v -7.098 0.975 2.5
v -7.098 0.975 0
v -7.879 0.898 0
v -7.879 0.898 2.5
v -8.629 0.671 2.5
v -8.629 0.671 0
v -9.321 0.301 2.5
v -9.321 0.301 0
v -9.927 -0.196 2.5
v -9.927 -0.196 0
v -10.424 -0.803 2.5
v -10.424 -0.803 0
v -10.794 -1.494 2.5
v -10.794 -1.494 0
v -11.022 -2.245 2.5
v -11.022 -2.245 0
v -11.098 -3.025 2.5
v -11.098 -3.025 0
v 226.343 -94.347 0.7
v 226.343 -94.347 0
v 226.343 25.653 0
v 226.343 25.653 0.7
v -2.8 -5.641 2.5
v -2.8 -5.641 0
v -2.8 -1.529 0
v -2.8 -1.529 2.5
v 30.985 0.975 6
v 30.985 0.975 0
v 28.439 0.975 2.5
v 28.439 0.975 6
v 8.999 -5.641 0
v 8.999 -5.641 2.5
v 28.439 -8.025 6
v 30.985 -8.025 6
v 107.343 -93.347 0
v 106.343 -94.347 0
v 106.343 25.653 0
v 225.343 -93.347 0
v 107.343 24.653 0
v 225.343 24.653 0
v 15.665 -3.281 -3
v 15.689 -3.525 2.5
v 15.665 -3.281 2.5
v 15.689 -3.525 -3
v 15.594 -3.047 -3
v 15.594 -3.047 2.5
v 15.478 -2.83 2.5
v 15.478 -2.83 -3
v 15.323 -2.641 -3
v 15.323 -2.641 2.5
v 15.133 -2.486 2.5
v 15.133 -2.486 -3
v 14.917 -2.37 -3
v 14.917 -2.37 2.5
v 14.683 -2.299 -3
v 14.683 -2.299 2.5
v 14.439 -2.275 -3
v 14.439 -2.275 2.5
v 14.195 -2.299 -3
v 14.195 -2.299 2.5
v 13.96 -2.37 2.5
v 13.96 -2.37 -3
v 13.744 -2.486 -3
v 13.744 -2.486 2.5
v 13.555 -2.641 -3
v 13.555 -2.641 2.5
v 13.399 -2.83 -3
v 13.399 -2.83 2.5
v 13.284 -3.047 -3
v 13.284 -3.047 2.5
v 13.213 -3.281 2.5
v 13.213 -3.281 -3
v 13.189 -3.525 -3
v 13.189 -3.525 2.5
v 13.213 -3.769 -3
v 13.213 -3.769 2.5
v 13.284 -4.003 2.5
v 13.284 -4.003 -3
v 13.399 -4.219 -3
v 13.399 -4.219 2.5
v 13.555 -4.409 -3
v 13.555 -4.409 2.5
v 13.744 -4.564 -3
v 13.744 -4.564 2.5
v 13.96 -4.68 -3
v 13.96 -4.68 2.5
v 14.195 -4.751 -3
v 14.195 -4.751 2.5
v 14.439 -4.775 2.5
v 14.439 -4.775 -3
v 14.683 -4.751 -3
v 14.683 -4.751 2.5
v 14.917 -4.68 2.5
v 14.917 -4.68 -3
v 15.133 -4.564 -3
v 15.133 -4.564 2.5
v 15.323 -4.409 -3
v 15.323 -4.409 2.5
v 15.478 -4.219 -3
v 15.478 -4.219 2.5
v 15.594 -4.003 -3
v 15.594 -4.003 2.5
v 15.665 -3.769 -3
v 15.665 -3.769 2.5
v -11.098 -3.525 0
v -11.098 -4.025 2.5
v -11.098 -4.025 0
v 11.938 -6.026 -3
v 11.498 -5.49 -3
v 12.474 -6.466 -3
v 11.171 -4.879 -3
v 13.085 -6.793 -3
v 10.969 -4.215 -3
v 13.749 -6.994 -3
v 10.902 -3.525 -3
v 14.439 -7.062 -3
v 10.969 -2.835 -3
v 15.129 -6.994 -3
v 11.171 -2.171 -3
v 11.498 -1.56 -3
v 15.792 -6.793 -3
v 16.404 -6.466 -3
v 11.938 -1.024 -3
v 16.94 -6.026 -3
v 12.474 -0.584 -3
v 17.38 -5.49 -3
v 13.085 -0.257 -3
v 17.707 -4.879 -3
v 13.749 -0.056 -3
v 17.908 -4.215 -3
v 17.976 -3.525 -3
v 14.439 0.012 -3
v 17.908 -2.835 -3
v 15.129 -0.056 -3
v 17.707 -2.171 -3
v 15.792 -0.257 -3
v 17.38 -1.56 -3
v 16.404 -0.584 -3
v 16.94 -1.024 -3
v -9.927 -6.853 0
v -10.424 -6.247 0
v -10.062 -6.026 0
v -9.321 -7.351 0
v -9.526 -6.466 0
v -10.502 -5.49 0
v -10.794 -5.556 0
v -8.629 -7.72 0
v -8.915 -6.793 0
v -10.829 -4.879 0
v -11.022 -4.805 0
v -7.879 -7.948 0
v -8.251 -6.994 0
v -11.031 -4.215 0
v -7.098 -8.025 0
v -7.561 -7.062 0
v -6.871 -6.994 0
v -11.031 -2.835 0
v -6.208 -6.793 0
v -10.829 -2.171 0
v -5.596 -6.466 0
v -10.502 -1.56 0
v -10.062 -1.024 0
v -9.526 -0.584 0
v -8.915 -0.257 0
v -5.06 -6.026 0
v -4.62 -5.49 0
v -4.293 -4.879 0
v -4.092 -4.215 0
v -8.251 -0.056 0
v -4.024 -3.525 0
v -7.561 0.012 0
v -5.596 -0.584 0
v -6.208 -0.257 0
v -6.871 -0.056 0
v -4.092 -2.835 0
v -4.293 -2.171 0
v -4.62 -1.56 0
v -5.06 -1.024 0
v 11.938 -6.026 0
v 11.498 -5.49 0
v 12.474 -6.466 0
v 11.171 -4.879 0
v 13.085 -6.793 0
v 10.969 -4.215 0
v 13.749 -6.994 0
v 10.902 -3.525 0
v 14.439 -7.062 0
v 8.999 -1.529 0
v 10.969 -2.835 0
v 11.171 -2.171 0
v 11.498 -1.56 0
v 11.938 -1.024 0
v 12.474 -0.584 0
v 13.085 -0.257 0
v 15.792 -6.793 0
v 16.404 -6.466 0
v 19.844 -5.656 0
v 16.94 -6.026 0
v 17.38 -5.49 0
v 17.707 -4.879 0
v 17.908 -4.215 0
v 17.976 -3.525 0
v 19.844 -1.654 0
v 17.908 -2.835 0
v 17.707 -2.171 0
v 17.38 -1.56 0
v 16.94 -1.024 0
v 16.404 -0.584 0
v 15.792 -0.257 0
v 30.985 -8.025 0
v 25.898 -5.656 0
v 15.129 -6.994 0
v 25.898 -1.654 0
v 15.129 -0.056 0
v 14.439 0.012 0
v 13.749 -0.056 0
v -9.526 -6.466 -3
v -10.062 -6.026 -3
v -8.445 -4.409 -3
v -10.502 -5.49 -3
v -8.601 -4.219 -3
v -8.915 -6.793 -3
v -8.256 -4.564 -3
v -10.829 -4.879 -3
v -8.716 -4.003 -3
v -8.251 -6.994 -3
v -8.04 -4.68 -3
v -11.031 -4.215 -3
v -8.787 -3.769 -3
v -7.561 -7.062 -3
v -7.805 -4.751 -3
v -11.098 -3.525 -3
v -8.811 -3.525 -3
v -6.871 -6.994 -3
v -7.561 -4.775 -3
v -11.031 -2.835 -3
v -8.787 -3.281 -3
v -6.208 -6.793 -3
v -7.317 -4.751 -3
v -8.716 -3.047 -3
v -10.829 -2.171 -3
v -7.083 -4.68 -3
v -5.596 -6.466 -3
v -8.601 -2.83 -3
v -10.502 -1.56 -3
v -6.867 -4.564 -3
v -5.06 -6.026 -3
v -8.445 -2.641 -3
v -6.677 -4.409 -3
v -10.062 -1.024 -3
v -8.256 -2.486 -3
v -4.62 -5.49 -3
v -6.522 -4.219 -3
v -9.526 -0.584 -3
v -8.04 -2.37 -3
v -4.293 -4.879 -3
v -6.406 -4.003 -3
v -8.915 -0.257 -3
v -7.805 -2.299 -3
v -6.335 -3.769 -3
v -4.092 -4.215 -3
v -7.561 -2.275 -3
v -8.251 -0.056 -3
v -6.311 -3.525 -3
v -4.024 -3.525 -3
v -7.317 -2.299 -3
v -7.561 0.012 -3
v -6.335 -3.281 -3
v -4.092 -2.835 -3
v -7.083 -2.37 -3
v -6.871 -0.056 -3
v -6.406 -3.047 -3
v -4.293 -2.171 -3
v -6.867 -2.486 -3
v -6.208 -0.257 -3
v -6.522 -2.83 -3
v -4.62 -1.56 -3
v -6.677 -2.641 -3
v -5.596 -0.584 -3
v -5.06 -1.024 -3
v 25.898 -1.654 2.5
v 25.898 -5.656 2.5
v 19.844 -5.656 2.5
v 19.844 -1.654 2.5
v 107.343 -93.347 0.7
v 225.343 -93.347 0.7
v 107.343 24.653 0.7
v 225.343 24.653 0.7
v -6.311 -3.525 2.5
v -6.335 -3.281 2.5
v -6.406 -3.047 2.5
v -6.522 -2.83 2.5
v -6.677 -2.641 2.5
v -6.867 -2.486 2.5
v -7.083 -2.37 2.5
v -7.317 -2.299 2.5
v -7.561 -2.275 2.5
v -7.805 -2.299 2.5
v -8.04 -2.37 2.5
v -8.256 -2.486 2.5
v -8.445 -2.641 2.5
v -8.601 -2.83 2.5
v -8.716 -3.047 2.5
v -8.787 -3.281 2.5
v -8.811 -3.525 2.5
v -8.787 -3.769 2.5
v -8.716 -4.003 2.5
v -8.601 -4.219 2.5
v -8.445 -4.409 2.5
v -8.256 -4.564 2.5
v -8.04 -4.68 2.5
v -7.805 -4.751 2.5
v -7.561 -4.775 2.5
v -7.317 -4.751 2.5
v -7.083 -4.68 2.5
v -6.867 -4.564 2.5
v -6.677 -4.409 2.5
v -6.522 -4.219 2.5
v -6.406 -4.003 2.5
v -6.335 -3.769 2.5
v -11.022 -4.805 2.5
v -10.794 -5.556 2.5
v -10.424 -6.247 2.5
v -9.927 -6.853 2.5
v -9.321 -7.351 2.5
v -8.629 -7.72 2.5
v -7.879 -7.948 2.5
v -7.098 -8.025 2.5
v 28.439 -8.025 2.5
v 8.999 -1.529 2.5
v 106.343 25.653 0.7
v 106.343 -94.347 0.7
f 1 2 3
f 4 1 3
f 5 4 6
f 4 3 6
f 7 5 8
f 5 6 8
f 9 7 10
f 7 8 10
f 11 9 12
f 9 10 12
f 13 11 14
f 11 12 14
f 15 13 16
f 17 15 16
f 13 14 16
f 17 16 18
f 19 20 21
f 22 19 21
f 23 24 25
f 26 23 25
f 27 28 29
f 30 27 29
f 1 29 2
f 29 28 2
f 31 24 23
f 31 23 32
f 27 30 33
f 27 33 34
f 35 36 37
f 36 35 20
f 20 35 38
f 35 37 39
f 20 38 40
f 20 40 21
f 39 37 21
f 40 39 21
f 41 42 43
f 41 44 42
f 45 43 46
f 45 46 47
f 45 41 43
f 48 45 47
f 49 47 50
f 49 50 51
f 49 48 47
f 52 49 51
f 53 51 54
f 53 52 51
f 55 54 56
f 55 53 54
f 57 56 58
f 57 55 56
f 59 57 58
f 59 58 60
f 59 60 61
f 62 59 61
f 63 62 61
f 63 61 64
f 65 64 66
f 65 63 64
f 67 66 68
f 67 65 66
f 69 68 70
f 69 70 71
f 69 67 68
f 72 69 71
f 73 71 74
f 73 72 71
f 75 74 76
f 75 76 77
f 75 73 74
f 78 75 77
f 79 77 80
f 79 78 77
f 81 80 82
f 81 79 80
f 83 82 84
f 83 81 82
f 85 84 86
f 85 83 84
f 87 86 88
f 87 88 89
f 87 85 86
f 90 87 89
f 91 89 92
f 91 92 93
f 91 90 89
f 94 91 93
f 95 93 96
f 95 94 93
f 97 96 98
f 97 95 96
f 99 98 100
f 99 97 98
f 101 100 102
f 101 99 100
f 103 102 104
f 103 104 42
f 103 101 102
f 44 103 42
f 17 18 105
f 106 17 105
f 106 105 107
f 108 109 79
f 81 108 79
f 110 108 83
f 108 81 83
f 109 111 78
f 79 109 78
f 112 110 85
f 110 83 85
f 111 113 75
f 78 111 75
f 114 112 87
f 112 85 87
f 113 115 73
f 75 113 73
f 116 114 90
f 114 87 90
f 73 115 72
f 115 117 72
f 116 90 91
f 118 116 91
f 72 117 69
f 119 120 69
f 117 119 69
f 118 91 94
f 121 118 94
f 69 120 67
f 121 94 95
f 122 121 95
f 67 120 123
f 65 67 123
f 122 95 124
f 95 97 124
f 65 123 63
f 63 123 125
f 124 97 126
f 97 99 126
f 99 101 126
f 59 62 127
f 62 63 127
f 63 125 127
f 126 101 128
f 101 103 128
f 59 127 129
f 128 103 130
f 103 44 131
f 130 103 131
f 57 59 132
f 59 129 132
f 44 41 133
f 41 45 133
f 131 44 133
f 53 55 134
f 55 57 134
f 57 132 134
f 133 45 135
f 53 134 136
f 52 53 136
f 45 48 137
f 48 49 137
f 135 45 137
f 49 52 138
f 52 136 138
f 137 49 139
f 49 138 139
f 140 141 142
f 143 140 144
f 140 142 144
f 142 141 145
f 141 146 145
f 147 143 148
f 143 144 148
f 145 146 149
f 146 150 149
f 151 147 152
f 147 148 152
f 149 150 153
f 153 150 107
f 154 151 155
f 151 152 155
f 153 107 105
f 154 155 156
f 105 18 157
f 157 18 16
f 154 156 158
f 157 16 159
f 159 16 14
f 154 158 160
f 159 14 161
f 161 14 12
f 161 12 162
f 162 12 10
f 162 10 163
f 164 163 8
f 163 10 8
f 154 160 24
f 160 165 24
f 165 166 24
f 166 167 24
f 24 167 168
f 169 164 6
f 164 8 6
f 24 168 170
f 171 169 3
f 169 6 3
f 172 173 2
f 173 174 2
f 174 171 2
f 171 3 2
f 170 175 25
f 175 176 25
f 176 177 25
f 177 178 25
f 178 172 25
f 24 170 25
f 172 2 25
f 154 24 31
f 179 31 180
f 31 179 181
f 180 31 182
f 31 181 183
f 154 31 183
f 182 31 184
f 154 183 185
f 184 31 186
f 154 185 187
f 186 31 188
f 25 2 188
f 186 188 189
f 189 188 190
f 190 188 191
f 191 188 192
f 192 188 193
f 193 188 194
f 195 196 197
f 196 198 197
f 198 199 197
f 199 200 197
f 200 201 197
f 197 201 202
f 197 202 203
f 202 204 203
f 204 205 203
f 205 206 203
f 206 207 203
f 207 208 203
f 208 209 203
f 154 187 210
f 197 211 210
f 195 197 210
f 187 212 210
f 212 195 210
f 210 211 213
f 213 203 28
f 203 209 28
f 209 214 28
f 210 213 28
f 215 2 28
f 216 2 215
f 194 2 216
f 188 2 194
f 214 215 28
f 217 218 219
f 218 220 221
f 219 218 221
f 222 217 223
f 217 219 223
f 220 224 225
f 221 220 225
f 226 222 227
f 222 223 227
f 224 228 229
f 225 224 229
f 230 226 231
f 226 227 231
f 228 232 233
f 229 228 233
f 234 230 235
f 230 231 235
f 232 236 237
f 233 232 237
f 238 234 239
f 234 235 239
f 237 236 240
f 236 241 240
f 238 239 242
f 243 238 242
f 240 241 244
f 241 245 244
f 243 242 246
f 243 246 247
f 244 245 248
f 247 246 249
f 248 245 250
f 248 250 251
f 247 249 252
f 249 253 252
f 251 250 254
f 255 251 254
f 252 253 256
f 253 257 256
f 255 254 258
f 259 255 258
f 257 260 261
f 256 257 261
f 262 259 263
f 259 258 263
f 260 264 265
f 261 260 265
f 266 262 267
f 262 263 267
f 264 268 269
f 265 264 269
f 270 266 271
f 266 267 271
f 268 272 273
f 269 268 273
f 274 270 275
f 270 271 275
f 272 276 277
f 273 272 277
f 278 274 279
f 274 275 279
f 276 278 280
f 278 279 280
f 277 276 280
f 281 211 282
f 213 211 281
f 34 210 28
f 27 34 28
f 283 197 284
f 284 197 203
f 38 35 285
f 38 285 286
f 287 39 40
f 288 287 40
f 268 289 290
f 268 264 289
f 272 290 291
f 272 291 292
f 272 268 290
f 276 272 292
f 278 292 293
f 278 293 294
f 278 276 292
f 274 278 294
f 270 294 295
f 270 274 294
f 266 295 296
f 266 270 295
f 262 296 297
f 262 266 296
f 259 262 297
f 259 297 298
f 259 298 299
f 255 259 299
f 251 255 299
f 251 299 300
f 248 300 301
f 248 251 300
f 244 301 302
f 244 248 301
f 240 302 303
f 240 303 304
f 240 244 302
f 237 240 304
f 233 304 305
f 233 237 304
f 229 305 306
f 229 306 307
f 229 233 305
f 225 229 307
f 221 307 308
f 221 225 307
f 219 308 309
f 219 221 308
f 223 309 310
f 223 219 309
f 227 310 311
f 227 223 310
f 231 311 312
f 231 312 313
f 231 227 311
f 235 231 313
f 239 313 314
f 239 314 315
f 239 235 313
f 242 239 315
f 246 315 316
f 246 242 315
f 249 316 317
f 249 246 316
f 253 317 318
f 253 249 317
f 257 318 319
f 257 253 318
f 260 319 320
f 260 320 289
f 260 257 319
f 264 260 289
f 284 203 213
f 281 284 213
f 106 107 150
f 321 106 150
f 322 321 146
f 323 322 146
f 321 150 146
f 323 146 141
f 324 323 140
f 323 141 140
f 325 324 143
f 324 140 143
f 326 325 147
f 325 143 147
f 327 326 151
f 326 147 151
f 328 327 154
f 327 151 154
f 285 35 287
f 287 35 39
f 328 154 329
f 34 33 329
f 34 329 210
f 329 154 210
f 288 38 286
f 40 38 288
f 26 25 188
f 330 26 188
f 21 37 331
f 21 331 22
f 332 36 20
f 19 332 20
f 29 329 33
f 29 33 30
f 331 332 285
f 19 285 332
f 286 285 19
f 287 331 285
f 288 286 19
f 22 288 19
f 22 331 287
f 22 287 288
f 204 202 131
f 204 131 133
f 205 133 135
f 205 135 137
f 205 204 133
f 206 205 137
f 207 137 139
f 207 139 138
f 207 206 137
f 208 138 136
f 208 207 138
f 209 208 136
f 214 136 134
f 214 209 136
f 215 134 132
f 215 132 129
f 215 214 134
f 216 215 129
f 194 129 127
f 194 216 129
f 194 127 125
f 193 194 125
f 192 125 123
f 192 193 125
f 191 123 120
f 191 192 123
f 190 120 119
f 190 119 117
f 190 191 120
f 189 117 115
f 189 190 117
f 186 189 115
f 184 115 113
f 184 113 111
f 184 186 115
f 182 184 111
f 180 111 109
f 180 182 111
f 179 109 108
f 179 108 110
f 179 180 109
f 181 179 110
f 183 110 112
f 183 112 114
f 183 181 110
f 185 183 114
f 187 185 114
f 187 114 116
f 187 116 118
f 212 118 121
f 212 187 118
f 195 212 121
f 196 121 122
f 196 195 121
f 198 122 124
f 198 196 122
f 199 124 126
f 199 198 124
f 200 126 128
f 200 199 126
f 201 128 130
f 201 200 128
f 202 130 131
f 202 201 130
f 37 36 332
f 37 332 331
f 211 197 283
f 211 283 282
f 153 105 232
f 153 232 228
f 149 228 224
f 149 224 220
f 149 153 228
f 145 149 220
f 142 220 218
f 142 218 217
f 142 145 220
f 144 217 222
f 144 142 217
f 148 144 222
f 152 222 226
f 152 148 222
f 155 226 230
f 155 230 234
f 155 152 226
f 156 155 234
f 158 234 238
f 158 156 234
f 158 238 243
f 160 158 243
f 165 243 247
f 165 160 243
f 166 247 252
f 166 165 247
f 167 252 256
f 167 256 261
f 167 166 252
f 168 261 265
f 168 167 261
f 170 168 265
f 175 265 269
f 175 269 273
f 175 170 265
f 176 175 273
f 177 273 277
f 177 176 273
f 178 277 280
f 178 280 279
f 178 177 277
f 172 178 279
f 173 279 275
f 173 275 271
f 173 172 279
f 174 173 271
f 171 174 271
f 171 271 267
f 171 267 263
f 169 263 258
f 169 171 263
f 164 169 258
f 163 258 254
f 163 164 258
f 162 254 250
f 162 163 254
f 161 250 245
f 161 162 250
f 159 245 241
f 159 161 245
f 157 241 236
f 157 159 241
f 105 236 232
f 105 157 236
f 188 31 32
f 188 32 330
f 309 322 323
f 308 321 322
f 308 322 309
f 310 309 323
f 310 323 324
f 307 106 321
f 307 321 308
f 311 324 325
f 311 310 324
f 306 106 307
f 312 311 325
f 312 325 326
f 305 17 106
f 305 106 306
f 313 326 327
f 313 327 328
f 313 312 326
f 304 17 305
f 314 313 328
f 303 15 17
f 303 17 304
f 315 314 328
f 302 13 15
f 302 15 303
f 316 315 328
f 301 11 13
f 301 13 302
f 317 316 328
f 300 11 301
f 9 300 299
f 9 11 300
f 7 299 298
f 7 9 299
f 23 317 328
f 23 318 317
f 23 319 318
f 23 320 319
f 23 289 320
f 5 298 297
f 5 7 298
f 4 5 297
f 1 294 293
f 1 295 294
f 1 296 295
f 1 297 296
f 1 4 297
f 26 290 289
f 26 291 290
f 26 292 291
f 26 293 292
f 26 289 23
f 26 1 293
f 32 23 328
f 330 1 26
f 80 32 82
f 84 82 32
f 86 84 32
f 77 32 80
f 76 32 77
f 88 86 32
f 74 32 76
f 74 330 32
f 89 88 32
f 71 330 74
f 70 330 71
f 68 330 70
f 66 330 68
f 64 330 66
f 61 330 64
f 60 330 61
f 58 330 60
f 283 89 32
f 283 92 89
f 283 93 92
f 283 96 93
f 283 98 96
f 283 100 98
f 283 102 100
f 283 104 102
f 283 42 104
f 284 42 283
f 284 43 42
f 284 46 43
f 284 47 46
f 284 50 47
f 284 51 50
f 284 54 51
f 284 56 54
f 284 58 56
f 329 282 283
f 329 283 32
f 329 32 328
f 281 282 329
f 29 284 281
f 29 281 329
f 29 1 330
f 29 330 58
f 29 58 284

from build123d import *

# Parameters (mm, degrees)
F0_W     = 11.7987894919
F0_H     = 4.111728631
F0_R     = 3.5371973142
F0_W_2   = 6.053224206
F0_H_2   = 4.0023974143
F0_W_3   = 2.5464419901
F0_H_3   = 9
F0_R_2   = 1.25
F1_DEPTH = 2.5
F2_DEPTH = 3
F3_DEPTH = 6
F4_DEPTH = 0.7
F0_W_4   = 120
F0_H_4   = 120
F0_W_5   = 118
F0_H_5   = 118


with BuildPart() as f1:
    # F0 (on Top) → F1 (new body)
    with BuildSketch(Plane.XY):
        with BuildLine():
            Line((28.4387205392, -8.0249160528), (28.4387205392, 0.9750839472))
            Line((28.4387205392, 0.9750839472), (-7.098476775, 0.9750839472))
            ThreePointArc((-7.098476775, 0.9750839472), (-9.9269038998, -0.1964889281), (-11.098476775, -3.0249160528))
            Line((-11.098476775, -3.0249160528), (-11.098476775, -3.524916043))
            Line((-11.098476775, -3.524916043), (-11.098476775, -4.0249160528))
            ThreePointArc((-11.098476775, -4.0249160528), (-9.9269038998, -6.8533431776), (-7.098476775, -8.0249160528))
            Line((-7.098476775, -8.0249160528), (28.4387205392, -8.0249160528))
        make_face()
        with BuildLine():
            ThreePointArc((-4.0240821465, -3.5249160528), (-7.5612794657, -7.0621133671), (-11.098476775, -3.524916043))
            ThreePointArc((-11.098476775, -3.524916043), (-7.5612794559, 0.0122812614), (-4.0240821465, -3.5249160528))
        make_face(mode=Mode.SUBTRACT)
        with Locations((3.0995766865, -3.5848133266)):
            Rectangle(F0_W, F0_H, mode=Mode.SUBTRACT)
        with Locations((14.4387205392, -3.5249160528)):
            Circle(F0_R, mode=Mode.SUBTRACT)
        with Locations((22.8709038347, -3.6549738143)):
            Rectangle(F0_W_2, F0_H_2, mode=Mode.SUBTRACT)
        with Locations((29.7119415343, -3.5249160528)):
            Rectangle(F0_W_3, F0_H_3)
        with BuildLine():
            ThreePointArc((-4.0240821465, -3.5249160528), (-7.5612794559, 0.0122812614), (-11.098476775, -3.524916043))
            ThreePointArc((-11.098476775, -3.524916043), (-7.5612794657, -7.0621133671), (-4.0240821465, -3.5249160528))
        make_face()
        with Locations((-7.5612794608, -3.5249160528)):
            Circle(F0_R_2, mode=Mode.SUBTRACT)
        with Locations((14.4387205392, -3.5249160528)):
            Circle(F0_R)
        with Locations((14.4387205392, -3.5249160528)):
            Circle(F0_R_2, mode=Mode.SUBTRACT)
    extrude(amount=F1_DEPTH)

    # F0 (on Top) → F2 (join)
    with BuildSketch(Plane.XY):
        with BuildLine():
            ThreePointArc((-4.0240821465, -3.5249160528), (-7.5612794559, 0.0122812614), (-11.098476775, -3.524916043))
            ThreePointArc((-11.098476775, -3.524916043), (-7.5612794657, -7.0621133671), (-4.0240821465, -3.5249160528))
        make_face()
        with Locations((-7.5612794608, -3.5249160528)):
            Circle(F0_R_2, mode=Mode.SUBTRACT)
        with Locations((14.4387205392, -3.5249160528)):
            Circle(F0_R)
        with Locations((14.4387205392, -3.5249160528)):
            Circle(F0_R_2, mode=Mode.SUBTRACT)
    extrude(amount=-F2_DEPTH)

    # F0 (on Top) → F3 (join)
    with BuildSketch(Plane.XY):
        with Locations((29.7119415343, -3.5249160528)):
            Rectangle(F0_W_3, F0_H_3)
    extrude(amount=F3_DEPTH)

    # F0 (on Top) → F4 (join)
    with BuildSketch(Plane.XY):
        with BuildLine():
            Line((28.4387205392, -8.0249160528), (28.4387205392, 0.9750839472))
            Line((28.4387205392, 0.9750839472), (-7.098476775, 0.9750839472))
            ThreePointArc((-7.098476775, 0.9750839472), (-9.9269038998, -0.1964889281), (-11.098476775, -3.0249160528))
            Line((-11.098476775, -3.0249160528), (-11.098476775, -3.524916043))
            Line((-11.098476775, -3.524916043), (-11.098476775, -4.0249160528))
            ThreePointArc((-11.098476775, -4.0249160528), (-9.9269038998, -6.8533431776), (-7.098476775, -8.0249160528))
            Line((-7.098476775, -8.0249160528), (28.4387205392, -8.0249160528))
        make_face()
        with BuildLine():
            ThreePointArc((-4.0240821465, -3.5249160528), (-7.5612794657, -7.0621133671), (-11.098476775, -3.524916043))
            ThreePointArc((-11.098476775, -3.524916043), (-7.5612794559, 0.0122812614), (-4.0240821465, -3.5249160528))
        make_face(mode=Mode.SUBTRACT)
        with Locations((3.0995766865, -3.5848133266)):
            Rectangle(F0_W, F0_H, mode=Mode.SUBTRACT)
        with Locations((14.4387205392, -3.5249160528)):
            Circle(F0_R, mode=Mode.SUBTRACT)
        with Locations((22.8709038347, -3.6549738143)):
            Rectangle(F0_W_2, F0_H_2, mode=Mode.SUBTRACT)
        with BuildLine():
            ThreePointArc((-4.0240821465, -3.5249160528), (-7.5612794559, 0.0122812614), (-11.098476775, -3.524916043))
            ThreePointArc((-11.098476775, -3.524916043), (-7.5612794657, -7.0621133671), (-4.0240821465, -3.5249160528))
        make_face()
        with Locations((-7.5612794608, -3.5249160528)):
            Circle(F0_R_2, mode=Mode.SUBTRACT)
        with Locations((29.7119415343, -3.5249160528)):
            Rectangle(F0_W_3, F0_H_3)
    extrude(amount=F4_DEPTH)


with BuildPart() as f4:
    # F0 (on Top) → F4, piece 2 (new body)
    with BuildSketch(Plane.XY):
        with Locations((166.3433039188, -34.3472906947)):
            Rectangle(F0_W_4, F0_H_4)
        with Locations((166.3433039188, -34.3472906947)):
            Rectangle(F0_W_5, F0_H_5, mode=Mode.SUBTRACT)
    extrude(amount=F4_DEPTH)


solid = Compound([f1.part, f4.part])
